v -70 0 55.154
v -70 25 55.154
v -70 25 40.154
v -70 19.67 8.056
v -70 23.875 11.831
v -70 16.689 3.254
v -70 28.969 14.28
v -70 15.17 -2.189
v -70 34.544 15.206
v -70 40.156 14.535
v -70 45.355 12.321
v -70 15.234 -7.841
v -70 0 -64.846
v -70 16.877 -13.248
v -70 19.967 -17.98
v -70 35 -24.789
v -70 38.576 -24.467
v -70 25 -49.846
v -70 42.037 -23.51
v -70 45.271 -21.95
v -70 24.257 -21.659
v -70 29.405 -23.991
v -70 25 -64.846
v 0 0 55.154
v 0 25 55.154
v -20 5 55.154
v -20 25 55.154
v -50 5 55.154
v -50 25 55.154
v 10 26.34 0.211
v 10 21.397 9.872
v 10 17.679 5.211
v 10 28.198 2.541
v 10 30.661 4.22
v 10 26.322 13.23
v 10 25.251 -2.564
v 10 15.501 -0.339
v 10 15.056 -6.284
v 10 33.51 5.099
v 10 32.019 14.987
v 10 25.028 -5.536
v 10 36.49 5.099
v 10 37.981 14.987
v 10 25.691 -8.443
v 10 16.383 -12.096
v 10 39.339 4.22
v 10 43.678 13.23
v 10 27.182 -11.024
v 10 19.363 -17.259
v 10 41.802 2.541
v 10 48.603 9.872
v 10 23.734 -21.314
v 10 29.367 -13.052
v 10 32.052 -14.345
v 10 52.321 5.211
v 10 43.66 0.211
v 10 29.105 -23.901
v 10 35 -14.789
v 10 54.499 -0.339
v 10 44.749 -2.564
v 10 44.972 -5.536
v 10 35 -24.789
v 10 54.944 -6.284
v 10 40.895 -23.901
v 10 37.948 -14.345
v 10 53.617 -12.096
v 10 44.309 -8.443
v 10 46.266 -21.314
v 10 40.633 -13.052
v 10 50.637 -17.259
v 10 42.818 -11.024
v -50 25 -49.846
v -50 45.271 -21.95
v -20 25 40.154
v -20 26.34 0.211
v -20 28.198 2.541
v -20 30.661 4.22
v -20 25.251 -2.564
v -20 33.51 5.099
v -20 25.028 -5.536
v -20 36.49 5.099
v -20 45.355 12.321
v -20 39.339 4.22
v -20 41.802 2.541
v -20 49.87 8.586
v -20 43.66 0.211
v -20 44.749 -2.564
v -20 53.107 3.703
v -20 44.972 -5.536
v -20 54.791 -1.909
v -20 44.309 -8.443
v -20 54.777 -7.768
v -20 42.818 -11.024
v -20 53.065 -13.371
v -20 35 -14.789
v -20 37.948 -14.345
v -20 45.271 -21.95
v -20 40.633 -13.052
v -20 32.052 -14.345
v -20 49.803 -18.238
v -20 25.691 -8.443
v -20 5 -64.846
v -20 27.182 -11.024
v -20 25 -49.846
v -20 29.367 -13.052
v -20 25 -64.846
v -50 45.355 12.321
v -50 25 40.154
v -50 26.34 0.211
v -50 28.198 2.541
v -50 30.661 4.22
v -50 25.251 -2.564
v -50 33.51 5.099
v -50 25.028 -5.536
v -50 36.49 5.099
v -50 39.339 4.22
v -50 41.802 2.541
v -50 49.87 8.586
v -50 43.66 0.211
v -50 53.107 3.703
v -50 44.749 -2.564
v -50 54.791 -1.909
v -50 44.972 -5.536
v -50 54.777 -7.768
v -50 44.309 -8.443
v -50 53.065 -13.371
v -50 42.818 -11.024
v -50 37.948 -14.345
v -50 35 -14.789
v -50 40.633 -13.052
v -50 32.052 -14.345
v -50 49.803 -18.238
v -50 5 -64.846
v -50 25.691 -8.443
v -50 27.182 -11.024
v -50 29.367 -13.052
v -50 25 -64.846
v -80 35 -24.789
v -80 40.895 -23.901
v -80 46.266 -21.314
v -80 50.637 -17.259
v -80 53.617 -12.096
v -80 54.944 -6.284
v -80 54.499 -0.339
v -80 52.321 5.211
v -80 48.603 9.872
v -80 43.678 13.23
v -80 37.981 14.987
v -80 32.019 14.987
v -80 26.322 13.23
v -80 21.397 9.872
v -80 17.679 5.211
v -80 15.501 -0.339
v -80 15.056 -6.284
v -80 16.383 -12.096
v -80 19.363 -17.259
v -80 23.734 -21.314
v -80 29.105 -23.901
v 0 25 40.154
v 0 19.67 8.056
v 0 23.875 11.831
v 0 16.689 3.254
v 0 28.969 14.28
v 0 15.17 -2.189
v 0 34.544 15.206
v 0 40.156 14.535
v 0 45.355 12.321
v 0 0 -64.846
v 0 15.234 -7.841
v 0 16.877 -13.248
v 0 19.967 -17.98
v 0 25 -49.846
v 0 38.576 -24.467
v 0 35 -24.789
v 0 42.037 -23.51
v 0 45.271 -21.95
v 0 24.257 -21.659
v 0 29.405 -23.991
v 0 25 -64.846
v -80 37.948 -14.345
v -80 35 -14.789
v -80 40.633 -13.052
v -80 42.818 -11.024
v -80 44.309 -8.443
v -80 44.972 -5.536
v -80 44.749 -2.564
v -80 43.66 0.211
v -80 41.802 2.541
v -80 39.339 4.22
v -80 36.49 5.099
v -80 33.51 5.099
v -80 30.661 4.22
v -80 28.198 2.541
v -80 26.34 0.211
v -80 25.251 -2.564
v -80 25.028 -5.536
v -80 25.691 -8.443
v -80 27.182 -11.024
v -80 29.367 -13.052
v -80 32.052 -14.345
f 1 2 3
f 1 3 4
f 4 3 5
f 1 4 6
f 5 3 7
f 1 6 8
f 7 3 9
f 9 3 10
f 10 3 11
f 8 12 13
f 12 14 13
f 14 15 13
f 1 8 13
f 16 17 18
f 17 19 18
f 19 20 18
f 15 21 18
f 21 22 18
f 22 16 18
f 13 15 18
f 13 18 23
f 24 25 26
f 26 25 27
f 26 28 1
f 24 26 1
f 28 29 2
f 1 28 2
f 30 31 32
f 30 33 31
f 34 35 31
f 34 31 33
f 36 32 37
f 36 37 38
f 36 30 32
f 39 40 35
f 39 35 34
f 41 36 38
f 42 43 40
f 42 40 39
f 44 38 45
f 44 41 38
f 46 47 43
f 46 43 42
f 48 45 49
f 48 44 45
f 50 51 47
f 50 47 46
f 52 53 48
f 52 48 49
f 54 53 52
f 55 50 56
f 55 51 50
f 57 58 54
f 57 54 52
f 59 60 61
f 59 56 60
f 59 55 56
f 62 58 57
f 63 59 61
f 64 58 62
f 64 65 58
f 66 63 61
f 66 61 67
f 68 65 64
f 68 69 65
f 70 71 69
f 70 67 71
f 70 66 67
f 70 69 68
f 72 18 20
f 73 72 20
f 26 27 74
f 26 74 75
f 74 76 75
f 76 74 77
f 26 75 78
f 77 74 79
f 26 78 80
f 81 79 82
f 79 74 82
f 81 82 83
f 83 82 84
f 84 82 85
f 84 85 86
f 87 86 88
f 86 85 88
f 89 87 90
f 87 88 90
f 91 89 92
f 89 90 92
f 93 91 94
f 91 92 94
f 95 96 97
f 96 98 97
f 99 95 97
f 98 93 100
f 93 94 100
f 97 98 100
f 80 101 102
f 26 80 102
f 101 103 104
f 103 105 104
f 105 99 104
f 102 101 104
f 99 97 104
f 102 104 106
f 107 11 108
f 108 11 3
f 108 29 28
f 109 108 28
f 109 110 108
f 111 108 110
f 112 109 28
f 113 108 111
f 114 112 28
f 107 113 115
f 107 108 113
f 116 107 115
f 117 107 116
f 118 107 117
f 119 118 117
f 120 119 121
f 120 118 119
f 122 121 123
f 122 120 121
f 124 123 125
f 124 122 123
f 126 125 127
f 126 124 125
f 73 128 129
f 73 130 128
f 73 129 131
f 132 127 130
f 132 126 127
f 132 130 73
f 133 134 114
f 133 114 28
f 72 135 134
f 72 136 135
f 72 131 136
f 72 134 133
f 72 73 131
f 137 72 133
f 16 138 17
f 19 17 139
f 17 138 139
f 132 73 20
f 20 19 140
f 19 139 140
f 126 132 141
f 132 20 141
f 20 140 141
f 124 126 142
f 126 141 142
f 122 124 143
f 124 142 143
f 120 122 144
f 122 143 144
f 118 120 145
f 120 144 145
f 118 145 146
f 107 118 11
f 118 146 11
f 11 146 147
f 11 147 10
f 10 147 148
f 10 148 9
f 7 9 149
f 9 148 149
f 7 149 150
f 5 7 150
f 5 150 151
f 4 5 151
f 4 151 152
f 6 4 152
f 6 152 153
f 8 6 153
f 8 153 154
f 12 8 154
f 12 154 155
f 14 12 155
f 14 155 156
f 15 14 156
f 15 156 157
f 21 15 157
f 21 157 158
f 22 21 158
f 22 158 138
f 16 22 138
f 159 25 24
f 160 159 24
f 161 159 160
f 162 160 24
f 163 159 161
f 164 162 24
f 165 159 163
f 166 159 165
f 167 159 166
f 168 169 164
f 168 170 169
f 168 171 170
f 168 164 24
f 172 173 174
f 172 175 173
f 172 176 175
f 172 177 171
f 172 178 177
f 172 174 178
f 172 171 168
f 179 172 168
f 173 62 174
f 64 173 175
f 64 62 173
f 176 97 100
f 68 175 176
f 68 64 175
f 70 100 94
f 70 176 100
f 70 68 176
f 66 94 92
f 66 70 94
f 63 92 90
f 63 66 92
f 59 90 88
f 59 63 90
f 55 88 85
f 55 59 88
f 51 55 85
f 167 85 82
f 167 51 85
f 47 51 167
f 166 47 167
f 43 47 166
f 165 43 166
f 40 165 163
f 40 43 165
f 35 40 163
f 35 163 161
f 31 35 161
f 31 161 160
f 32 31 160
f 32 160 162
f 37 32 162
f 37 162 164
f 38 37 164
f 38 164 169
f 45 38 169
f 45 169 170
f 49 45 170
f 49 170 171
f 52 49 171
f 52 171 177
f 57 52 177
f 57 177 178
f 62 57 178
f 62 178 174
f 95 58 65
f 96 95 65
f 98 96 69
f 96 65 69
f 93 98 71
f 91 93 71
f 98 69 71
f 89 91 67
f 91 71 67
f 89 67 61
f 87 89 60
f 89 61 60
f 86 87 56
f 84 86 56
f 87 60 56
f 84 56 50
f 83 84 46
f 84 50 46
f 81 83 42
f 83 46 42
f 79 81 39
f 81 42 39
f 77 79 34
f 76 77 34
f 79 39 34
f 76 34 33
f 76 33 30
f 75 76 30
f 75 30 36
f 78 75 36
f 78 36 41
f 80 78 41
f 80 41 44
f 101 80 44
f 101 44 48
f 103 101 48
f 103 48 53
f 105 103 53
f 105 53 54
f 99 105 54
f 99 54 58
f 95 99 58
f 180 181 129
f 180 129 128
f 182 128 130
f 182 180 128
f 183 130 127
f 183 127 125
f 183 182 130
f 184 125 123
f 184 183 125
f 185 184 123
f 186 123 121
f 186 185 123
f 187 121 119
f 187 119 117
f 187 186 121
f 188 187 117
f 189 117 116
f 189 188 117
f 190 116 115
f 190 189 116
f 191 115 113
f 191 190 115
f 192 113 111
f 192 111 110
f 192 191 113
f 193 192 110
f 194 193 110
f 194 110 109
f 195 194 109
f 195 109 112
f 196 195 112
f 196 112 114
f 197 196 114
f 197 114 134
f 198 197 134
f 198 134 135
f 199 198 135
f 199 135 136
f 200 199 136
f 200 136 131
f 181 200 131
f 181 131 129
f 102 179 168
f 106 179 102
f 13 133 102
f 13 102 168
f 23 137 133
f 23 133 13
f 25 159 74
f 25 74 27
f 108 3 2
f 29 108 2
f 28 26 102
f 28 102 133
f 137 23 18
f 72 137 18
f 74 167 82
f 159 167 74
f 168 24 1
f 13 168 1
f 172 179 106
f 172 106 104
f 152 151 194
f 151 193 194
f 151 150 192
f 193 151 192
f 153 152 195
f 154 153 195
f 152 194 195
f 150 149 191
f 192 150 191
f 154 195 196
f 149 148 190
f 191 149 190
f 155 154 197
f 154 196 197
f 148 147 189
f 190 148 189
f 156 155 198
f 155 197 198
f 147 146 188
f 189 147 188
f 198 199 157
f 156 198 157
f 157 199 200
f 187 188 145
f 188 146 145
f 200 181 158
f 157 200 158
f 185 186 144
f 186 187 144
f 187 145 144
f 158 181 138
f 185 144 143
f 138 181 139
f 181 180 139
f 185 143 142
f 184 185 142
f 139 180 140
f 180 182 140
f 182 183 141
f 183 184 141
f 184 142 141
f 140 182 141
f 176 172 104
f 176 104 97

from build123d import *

# Parameters (mm, degrees)
SKETCH1_R           = 20
SKETCH1_R_2         = 10
BOSS_EXTRUDE2_DEPTH = 20
BOSS_EXTRUDE3_START = 10
SKETCH2_R           = 20
SKETCH2_R_2         = 10
BOSS_EXTRUDE3_DEPTH = 10
SKETCH3_W           = 15
SKETCH3_H           = 5
BOSS_EXTRUDE4_DEPTH = 120


with BuildPart() as part:
    # Sketch1 → Boss-Extrude2 (new body)
    # profile 1 of 2: a face of its own
    with BuildSketch(Plane(origin=(0, 0, 0), x_dir=(0, 0, -1), z_dir=(1, 0, 0))):
        with BuildLine():
            Line((-55.154478161, 25), (-55.154478161, 0))
            Line((-55.154478161, 0), (64.845521839, 0))
            Line((64.845521839, 0), (64.845521839, 25))
            Line((64.845521839, 25), (49.845521839, 25))
            Line((49.845521839, 25), (21.950490606, 45.270819657))
            ThreePointArc((21.950490606, 45.270819657), (24.06645602, 40.32794394), (24.789189269, 35))
            ThreePointArc((24.789189269, 35), (-0.58635613, 15.735952874), (-12.321161896, 45.35547599))
            Line((-12.321161896, 45.35547599), (-40.154478161, 25))
            Line((-40.154478161, 25), (-55.154478161, 25))
        make_face()
    # profile 2 of 2: a face of its own
    with BuildSketch(Plane(origin=(0, 0, 0), x_dir=(0, 0, -1), z_dir=(1, 0, 0))):
        with Locations((4.789189269, 35)):
            Circle(SKETCH1_R)
        with Locations((4.789189269, 35)):
            Circle(SKETCH1_R_2, mode=Mode.SUBTRACT)
    extrude(amount=-BOSS_EXTRUDE2_DEPTH)

    # Sketch2 → Boss-Extrude3 (add)
    with BuildSketch(Plane(origin=(0, 0, 0), x_dir=(0, 0, -1), z_dir=(1, 0, 0)).offset(BOSS_EXTRUDE3_START)):
        with Locations((4.789189269, 35)):
            Circle(SKETCH2_R)
        with Locations((4.789189269, 35)):
            Circle(SKETCH2_R_2, mode=Mode.SUBTRACT)
    extrude(amount=-BOSS_EXTRUDE3_DEPTH)

    # Sketch3 → Boss-Extrude4 (add)
    with BuildSketch(Plane.XY.offset(55.154478161)):
        with Locations((-27.5, 2.5)):
            Rectangle(SKETCH3_W, SKETCH3_H)
    extrude(amount=-BOSS_EXTRUDE4_DEPTH)

    # Mirror1: part across plane


with BuildPart() as part_1:
    add(part.part)
    add(part.part.mirror(Plane.ZY.offset(35)))


solid = part_1.part
